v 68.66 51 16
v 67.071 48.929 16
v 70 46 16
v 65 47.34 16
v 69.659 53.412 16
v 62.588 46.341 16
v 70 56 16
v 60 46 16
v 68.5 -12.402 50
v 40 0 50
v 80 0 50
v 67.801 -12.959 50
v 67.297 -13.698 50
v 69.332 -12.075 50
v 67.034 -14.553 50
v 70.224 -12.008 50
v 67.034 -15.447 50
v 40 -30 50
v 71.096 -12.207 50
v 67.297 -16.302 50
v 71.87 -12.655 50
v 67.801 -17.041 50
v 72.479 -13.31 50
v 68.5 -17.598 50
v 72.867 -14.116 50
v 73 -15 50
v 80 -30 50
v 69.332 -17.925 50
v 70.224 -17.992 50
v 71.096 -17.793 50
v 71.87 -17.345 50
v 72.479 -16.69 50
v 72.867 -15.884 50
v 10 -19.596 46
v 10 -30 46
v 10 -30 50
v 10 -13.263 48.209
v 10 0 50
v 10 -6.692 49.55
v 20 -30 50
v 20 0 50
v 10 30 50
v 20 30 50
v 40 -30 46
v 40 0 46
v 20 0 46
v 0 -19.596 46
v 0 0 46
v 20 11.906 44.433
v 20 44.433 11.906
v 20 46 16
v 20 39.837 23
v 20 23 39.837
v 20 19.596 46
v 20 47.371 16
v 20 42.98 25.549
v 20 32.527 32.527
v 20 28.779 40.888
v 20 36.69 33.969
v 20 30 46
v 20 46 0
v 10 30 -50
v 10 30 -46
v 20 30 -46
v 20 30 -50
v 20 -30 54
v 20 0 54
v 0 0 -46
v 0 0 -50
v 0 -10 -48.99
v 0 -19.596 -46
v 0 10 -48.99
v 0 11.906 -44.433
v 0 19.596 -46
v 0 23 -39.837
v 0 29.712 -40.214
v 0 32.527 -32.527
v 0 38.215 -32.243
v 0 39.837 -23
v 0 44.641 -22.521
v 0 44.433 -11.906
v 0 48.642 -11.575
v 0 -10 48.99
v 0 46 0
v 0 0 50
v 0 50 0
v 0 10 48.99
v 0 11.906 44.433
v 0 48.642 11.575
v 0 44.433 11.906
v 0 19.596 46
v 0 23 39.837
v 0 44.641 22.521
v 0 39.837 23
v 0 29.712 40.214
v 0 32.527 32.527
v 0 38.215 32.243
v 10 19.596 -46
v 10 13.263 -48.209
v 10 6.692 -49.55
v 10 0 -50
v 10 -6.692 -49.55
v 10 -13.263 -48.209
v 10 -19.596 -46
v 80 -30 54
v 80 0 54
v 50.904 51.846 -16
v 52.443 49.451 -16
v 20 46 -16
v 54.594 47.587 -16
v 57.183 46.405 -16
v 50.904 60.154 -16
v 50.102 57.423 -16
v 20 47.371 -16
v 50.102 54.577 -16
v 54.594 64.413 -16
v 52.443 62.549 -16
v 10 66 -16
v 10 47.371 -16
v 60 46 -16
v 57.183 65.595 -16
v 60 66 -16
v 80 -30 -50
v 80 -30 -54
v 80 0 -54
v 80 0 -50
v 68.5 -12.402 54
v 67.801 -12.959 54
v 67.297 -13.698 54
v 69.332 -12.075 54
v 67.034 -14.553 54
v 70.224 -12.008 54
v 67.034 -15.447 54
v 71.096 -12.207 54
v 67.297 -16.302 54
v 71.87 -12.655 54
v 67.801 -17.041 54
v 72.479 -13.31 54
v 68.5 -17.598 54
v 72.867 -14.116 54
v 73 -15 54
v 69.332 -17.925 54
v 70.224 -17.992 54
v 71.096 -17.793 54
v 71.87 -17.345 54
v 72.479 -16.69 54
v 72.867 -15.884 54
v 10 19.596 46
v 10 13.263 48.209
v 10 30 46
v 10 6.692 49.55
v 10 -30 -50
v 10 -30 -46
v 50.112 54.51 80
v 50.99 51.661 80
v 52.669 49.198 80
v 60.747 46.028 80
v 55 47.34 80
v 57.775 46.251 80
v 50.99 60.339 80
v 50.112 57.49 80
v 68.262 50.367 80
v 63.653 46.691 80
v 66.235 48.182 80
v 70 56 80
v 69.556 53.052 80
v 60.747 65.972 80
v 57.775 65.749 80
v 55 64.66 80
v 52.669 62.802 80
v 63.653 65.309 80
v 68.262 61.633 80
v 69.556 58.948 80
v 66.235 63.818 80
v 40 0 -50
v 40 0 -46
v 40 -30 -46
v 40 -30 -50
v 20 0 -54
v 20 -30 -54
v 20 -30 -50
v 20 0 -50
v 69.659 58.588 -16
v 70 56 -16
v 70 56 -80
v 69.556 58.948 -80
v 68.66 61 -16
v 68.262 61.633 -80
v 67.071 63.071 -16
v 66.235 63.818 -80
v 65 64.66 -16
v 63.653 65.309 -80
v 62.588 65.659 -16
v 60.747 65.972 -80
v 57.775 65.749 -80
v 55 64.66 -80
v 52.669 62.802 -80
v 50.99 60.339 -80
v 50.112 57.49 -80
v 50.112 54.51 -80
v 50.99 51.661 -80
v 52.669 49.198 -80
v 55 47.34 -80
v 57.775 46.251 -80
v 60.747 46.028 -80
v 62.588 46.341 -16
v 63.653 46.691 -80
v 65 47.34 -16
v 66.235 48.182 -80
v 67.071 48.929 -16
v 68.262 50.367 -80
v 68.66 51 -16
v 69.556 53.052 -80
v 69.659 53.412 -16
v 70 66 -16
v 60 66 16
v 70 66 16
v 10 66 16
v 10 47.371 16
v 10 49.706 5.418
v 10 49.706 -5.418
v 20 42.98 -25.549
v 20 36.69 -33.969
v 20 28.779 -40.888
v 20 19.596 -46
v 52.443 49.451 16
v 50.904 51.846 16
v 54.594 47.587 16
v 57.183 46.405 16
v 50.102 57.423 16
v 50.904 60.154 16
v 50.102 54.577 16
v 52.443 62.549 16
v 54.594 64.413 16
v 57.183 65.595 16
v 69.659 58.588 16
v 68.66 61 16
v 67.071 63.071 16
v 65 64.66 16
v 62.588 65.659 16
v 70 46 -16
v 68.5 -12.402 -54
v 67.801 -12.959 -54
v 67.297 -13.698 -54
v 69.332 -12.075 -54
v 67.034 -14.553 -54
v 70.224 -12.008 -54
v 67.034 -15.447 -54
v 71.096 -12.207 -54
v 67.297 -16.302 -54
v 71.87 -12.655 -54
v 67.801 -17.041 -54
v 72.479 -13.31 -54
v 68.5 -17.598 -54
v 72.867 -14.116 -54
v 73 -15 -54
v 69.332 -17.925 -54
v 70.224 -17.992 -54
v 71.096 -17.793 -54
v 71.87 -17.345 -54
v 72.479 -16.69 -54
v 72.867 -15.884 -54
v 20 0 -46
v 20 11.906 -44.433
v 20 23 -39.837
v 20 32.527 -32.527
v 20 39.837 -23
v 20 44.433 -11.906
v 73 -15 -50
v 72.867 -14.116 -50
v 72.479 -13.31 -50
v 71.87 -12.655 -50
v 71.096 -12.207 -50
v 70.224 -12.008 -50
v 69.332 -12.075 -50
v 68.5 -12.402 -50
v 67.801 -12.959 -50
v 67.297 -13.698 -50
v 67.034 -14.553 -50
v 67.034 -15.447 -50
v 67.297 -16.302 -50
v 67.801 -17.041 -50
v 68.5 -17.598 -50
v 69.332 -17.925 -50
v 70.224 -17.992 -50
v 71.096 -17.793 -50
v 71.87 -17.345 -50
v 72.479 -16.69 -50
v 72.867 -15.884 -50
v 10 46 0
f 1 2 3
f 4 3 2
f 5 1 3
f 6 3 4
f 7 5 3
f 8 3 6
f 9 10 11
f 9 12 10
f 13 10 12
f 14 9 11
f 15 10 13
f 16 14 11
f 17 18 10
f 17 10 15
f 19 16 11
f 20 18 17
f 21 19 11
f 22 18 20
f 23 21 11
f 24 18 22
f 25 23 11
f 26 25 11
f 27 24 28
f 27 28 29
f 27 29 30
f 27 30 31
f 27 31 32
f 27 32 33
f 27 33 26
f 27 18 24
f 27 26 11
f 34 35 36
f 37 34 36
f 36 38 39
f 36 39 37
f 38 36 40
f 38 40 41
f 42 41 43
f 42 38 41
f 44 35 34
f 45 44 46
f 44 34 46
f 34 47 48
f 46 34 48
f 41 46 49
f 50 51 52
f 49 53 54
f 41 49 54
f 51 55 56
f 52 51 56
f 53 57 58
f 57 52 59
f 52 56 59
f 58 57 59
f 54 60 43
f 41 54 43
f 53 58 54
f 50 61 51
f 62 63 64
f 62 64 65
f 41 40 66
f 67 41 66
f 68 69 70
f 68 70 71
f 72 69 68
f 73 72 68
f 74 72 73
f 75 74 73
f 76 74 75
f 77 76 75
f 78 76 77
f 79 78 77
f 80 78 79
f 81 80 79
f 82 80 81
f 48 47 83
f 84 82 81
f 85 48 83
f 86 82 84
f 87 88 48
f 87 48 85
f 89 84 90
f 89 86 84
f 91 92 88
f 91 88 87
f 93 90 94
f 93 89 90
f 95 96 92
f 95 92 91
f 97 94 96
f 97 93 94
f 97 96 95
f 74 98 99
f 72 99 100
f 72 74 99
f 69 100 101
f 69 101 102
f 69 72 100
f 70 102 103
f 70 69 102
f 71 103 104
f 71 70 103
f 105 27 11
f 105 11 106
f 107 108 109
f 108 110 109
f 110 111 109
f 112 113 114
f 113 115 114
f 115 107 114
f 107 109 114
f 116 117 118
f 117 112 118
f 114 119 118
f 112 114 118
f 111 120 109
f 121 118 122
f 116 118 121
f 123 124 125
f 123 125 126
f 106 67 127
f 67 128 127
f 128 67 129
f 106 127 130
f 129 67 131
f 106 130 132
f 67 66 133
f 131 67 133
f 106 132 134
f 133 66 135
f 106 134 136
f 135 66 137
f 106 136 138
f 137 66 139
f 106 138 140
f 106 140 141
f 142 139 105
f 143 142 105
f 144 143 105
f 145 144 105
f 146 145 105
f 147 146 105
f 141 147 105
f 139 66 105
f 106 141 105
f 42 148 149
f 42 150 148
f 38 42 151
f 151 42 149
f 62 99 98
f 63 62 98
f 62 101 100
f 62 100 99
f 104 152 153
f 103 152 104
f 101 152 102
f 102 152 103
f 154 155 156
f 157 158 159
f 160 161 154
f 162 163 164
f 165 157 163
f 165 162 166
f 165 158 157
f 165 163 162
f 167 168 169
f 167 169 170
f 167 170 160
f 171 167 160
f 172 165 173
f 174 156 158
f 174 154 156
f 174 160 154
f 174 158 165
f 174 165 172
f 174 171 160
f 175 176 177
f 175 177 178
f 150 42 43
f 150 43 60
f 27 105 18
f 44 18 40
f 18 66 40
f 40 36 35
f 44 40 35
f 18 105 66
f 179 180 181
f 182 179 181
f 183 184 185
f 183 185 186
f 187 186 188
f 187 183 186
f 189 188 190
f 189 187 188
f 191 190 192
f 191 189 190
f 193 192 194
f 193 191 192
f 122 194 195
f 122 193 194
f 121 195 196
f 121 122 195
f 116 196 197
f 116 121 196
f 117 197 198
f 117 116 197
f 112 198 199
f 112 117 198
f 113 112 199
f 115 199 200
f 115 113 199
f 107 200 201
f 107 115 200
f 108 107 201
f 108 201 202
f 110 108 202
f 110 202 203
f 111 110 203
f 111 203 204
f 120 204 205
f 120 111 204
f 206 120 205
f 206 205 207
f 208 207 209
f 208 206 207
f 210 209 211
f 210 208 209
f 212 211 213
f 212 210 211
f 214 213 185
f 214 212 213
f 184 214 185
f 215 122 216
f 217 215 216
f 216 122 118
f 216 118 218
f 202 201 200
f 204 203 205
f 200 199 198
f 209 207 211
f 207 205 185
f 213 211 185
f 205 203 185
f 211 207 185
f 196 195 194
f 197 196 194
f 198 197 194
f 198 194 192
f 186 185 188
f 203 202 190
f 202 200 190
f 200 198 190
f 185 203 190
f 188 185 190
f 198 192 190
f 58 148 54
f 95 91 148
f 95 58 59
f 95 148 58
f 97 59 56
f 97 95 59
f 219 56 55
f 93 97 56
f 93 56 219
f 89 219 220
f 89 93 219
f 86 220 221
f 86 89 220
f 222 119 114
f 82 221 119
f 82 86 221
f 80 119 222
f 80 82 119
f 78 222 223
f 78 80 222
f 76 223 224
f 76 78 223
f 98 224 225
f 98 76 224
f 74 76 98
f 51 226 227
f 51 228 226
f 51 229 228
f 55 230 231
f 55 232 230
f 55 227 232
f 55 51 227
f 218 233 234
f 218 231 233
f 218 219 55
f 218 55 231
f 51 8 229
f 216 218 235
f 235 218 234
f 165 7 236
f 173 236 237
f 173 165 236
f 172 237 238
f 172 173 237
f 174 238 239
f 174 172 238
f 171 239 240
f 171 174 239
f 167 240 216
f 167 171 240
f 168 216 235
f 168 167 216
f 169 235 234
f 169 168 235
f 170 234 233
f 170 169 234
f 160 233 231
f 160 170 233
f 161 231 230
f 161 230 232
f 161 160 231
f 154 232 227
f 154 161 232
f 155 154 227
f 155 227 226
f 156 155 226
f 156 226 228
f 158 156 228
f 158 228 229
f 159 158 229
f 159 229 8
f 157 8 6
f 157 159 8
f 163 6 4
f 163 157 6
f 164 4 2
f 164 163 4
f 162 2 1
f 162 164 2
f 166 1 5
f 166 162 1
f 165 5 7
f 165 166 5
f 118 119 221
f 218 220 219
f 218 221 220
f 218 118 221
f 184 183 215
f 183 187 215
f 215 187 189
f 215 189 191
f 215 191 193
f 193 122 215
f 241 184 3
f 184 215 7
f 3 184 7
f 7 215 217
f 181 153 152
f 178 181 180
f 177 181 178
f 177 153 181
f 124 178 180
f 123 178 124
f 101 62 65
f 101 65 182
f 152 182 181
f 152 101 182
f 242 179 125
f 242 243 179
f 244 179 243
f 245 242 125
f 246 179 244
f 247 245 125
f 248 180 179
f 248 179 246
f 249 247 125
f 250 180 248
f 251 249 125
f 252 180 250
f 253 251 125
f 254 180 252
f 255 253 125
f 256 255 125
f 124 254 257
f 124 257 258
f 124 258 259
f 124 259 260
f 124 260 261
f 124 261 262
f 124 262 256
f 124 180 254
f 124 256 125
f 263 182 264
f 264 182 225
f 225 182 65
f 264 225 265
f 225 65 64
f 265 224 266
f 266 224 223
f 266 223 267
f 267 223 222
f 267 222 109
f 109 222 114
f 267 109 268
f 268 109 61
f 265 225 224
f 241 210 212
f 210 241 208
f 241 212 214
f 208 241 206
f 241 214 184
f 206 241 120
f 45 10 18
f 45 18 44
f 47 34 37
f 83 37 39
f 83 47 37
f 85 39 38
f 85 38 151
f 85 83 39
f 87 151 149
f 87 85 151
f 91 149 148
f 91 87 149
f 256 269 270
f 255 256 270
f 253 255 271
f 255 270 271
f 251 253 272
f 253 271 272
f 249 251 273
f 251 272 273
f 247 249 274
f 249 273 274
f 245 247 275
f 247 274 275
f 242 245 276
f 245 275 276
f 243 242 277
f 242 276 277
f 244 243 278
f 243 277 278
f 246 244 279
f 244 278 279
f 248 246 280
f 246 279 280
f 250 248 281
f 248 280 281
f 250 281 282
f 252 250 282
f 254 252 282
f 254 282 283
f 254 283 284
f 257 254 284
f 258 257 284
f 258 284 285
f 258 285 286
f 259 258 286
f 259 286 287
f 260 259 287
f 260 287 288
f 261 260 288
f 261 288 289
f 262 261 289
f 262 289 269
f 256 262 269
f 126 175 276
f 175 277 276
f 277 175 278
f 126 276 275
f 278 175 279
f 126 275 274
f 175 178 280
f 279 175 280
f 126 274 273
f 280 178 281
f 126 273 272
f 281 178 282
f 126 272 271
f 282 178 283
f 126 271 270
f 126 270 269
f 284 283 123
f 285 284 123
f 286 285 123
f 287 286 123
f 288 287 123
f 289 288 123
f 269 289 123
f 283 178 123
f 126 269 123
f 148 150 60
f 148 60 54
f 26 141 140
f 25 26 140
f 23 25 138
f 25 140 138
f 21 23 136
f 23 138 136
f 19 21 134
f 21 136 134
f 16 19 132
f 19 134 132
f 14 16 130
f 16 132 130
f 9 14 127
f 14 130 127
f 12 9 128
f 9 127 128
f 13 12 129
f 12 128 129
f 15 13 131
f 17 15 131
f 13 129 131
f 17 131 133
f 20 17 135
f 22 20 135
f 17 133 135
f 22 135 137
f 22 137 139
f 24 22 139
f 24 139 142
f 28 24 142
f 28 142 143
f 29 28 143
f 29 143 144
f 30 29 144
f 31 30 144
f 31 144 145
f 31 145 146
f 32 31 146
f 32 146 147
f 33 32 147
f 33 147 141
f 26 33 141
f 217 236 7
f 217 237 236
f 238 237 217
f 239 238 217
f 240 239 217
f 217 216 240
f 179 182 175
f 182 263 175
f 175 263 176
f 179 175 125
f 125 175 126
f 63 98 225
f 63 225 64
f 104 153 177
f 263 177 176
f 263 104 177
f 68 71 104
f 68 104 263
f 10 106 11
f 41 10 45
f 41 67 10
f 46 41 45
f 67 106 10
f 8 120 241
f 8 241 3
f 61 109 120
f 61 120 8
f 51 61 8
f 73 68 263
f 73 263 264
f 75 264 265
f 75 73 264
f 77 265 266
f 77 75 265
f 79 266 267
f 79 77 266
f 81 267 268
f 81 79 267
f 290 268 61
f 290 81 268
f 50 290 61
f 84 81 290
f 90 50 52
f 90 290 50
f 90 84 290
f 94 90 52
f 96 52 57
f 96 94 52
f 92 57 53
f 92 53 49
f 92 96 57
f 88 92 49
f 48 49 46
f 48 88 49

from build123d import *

# Parameters (mm, degrees)
EXTRUDE_1_DEPTH     = 20
SKETCH_2_W          = 4
SKETCH_2_H          = 30
EXTRUDE_3_DEPTH     = 20
SKETCH_4_R          = 60
SKETCH_4_R_2        = 50
CUT_EXTRUDE_2_DEPTH = 10
SKETCH_5_W          = 32
SKETCH_5_H          = 20
EXTRUDE_4_DEPTH     = 60
SKETCH_7_R          = 10
EXTRUDE_5_DEPTH     = 80
SKETCH_9_W          = 60
SKETCH_9_H          = 4
EXTRUDE_6_DEPTH     = 30
SKETCH_10_R         = 3
CUT_EXTRUDE_4_DEPTH = 135


with BuildPart() as part:
    # 草图1 → 凸台-拉伸1 (new body)
    with BuildSketch(Plane(origin=(0, 0, 0), x_dir=(0, 0, -1), z_dir=(1, 0, 0))):
        with BuildLine():
            Line((-50, 30), (-46, 30))
            Line((-46, 30), (-46, 19.595917942))
            ThreePointArc((-46, 19.595917942), (0, 50), (46, 19.595917942))
            Line((46, 19.595917942), (46, 30))
            Line((46, 30), (50, 30))
            Line((50, 30), (50, -30))
            Line((50, -30), (46, -30))
            Line((46, -30), (46, 0))
            ThreePointArc((46, 0), (0, 46), (-46, 0))
            Line((-46, 0), (-46, -30))
            Line((-46, -30), (-50, -30))
            Line((-50, -30), (-50, 30))
        make_face()
    extrude(amount=EXTRUDE_1_DEPTH)

    # 草图2 → 凸台-拉伸3 (add)
    with BuildSketch(Plane(origin=(20, 0, 0), x_dir=(0, 0, -1), z_dir=(1, 0, 0))):
        with Locations((-48, -15)):
            Rectangle(SKETCH_2_W, SKETCH_2_H)
        with Locations((48, -15)):
            Rectangle(SKETCH_2_W, SKETCH_2_H)
    extrude(amount=EXTRUDE_3_DEPTH)

    # 草图4 → 切除-拉伸2 (cut)
    with BuildSketch(Plane.ZY):
        Circle(SKETCH_4_R)
        Circle(SKETCH_4_R_2, mode=Mode.SUBTRACT)
    extrude(amount=-CUT_EXTRUDE_2_DEPTH, mode=Mode.SUBTRACT)

    # 草图5 → 凸台-拉伸4 (add)
    with BuildSketch(Plane.ZY.offset(-10)):
        with Locations((0, 56)):
            Rectangle(SKETCH_5_W, SKETCH_5_H)
    extrude(amount=-EXTRUDE_4_DEPTH)

    # 草图7 → 凸台-拉伸5 (add, symmetric)
    with BuildSketch(Plane.XY):
        with Locations((60, 56)):
            Circle(SKETCH_7_R)
    extrude(amount=EXTRUDE_5_DEPTH, both=True)

    # 草图9 → 凸台-拉伸6 (add)
    with BuildSketch(Plane.XZ.offset(30)):
        with Locations((50, -52)):
            Rectangle(SKETCH_9_W, SKETCH_9_H)
        with Locations((50, 52)):
            Rectangle(SKETCH_9_W, SKETCH_9_H)
    extrude(amount=-EXTRUDE_6_DEPTH)

    # 草图10 → 切除-拉伸4 (cut, through all)
    with BuildSketch(Plane.XY.offset(54)):
        with Locations((70, -15)):
            Circle(SKETCH_10_R)
    extrude(amount=-CUT_EXTRUDE_4_DEPTH, mode=Mode.SUBTRACT)


solid = part.part
